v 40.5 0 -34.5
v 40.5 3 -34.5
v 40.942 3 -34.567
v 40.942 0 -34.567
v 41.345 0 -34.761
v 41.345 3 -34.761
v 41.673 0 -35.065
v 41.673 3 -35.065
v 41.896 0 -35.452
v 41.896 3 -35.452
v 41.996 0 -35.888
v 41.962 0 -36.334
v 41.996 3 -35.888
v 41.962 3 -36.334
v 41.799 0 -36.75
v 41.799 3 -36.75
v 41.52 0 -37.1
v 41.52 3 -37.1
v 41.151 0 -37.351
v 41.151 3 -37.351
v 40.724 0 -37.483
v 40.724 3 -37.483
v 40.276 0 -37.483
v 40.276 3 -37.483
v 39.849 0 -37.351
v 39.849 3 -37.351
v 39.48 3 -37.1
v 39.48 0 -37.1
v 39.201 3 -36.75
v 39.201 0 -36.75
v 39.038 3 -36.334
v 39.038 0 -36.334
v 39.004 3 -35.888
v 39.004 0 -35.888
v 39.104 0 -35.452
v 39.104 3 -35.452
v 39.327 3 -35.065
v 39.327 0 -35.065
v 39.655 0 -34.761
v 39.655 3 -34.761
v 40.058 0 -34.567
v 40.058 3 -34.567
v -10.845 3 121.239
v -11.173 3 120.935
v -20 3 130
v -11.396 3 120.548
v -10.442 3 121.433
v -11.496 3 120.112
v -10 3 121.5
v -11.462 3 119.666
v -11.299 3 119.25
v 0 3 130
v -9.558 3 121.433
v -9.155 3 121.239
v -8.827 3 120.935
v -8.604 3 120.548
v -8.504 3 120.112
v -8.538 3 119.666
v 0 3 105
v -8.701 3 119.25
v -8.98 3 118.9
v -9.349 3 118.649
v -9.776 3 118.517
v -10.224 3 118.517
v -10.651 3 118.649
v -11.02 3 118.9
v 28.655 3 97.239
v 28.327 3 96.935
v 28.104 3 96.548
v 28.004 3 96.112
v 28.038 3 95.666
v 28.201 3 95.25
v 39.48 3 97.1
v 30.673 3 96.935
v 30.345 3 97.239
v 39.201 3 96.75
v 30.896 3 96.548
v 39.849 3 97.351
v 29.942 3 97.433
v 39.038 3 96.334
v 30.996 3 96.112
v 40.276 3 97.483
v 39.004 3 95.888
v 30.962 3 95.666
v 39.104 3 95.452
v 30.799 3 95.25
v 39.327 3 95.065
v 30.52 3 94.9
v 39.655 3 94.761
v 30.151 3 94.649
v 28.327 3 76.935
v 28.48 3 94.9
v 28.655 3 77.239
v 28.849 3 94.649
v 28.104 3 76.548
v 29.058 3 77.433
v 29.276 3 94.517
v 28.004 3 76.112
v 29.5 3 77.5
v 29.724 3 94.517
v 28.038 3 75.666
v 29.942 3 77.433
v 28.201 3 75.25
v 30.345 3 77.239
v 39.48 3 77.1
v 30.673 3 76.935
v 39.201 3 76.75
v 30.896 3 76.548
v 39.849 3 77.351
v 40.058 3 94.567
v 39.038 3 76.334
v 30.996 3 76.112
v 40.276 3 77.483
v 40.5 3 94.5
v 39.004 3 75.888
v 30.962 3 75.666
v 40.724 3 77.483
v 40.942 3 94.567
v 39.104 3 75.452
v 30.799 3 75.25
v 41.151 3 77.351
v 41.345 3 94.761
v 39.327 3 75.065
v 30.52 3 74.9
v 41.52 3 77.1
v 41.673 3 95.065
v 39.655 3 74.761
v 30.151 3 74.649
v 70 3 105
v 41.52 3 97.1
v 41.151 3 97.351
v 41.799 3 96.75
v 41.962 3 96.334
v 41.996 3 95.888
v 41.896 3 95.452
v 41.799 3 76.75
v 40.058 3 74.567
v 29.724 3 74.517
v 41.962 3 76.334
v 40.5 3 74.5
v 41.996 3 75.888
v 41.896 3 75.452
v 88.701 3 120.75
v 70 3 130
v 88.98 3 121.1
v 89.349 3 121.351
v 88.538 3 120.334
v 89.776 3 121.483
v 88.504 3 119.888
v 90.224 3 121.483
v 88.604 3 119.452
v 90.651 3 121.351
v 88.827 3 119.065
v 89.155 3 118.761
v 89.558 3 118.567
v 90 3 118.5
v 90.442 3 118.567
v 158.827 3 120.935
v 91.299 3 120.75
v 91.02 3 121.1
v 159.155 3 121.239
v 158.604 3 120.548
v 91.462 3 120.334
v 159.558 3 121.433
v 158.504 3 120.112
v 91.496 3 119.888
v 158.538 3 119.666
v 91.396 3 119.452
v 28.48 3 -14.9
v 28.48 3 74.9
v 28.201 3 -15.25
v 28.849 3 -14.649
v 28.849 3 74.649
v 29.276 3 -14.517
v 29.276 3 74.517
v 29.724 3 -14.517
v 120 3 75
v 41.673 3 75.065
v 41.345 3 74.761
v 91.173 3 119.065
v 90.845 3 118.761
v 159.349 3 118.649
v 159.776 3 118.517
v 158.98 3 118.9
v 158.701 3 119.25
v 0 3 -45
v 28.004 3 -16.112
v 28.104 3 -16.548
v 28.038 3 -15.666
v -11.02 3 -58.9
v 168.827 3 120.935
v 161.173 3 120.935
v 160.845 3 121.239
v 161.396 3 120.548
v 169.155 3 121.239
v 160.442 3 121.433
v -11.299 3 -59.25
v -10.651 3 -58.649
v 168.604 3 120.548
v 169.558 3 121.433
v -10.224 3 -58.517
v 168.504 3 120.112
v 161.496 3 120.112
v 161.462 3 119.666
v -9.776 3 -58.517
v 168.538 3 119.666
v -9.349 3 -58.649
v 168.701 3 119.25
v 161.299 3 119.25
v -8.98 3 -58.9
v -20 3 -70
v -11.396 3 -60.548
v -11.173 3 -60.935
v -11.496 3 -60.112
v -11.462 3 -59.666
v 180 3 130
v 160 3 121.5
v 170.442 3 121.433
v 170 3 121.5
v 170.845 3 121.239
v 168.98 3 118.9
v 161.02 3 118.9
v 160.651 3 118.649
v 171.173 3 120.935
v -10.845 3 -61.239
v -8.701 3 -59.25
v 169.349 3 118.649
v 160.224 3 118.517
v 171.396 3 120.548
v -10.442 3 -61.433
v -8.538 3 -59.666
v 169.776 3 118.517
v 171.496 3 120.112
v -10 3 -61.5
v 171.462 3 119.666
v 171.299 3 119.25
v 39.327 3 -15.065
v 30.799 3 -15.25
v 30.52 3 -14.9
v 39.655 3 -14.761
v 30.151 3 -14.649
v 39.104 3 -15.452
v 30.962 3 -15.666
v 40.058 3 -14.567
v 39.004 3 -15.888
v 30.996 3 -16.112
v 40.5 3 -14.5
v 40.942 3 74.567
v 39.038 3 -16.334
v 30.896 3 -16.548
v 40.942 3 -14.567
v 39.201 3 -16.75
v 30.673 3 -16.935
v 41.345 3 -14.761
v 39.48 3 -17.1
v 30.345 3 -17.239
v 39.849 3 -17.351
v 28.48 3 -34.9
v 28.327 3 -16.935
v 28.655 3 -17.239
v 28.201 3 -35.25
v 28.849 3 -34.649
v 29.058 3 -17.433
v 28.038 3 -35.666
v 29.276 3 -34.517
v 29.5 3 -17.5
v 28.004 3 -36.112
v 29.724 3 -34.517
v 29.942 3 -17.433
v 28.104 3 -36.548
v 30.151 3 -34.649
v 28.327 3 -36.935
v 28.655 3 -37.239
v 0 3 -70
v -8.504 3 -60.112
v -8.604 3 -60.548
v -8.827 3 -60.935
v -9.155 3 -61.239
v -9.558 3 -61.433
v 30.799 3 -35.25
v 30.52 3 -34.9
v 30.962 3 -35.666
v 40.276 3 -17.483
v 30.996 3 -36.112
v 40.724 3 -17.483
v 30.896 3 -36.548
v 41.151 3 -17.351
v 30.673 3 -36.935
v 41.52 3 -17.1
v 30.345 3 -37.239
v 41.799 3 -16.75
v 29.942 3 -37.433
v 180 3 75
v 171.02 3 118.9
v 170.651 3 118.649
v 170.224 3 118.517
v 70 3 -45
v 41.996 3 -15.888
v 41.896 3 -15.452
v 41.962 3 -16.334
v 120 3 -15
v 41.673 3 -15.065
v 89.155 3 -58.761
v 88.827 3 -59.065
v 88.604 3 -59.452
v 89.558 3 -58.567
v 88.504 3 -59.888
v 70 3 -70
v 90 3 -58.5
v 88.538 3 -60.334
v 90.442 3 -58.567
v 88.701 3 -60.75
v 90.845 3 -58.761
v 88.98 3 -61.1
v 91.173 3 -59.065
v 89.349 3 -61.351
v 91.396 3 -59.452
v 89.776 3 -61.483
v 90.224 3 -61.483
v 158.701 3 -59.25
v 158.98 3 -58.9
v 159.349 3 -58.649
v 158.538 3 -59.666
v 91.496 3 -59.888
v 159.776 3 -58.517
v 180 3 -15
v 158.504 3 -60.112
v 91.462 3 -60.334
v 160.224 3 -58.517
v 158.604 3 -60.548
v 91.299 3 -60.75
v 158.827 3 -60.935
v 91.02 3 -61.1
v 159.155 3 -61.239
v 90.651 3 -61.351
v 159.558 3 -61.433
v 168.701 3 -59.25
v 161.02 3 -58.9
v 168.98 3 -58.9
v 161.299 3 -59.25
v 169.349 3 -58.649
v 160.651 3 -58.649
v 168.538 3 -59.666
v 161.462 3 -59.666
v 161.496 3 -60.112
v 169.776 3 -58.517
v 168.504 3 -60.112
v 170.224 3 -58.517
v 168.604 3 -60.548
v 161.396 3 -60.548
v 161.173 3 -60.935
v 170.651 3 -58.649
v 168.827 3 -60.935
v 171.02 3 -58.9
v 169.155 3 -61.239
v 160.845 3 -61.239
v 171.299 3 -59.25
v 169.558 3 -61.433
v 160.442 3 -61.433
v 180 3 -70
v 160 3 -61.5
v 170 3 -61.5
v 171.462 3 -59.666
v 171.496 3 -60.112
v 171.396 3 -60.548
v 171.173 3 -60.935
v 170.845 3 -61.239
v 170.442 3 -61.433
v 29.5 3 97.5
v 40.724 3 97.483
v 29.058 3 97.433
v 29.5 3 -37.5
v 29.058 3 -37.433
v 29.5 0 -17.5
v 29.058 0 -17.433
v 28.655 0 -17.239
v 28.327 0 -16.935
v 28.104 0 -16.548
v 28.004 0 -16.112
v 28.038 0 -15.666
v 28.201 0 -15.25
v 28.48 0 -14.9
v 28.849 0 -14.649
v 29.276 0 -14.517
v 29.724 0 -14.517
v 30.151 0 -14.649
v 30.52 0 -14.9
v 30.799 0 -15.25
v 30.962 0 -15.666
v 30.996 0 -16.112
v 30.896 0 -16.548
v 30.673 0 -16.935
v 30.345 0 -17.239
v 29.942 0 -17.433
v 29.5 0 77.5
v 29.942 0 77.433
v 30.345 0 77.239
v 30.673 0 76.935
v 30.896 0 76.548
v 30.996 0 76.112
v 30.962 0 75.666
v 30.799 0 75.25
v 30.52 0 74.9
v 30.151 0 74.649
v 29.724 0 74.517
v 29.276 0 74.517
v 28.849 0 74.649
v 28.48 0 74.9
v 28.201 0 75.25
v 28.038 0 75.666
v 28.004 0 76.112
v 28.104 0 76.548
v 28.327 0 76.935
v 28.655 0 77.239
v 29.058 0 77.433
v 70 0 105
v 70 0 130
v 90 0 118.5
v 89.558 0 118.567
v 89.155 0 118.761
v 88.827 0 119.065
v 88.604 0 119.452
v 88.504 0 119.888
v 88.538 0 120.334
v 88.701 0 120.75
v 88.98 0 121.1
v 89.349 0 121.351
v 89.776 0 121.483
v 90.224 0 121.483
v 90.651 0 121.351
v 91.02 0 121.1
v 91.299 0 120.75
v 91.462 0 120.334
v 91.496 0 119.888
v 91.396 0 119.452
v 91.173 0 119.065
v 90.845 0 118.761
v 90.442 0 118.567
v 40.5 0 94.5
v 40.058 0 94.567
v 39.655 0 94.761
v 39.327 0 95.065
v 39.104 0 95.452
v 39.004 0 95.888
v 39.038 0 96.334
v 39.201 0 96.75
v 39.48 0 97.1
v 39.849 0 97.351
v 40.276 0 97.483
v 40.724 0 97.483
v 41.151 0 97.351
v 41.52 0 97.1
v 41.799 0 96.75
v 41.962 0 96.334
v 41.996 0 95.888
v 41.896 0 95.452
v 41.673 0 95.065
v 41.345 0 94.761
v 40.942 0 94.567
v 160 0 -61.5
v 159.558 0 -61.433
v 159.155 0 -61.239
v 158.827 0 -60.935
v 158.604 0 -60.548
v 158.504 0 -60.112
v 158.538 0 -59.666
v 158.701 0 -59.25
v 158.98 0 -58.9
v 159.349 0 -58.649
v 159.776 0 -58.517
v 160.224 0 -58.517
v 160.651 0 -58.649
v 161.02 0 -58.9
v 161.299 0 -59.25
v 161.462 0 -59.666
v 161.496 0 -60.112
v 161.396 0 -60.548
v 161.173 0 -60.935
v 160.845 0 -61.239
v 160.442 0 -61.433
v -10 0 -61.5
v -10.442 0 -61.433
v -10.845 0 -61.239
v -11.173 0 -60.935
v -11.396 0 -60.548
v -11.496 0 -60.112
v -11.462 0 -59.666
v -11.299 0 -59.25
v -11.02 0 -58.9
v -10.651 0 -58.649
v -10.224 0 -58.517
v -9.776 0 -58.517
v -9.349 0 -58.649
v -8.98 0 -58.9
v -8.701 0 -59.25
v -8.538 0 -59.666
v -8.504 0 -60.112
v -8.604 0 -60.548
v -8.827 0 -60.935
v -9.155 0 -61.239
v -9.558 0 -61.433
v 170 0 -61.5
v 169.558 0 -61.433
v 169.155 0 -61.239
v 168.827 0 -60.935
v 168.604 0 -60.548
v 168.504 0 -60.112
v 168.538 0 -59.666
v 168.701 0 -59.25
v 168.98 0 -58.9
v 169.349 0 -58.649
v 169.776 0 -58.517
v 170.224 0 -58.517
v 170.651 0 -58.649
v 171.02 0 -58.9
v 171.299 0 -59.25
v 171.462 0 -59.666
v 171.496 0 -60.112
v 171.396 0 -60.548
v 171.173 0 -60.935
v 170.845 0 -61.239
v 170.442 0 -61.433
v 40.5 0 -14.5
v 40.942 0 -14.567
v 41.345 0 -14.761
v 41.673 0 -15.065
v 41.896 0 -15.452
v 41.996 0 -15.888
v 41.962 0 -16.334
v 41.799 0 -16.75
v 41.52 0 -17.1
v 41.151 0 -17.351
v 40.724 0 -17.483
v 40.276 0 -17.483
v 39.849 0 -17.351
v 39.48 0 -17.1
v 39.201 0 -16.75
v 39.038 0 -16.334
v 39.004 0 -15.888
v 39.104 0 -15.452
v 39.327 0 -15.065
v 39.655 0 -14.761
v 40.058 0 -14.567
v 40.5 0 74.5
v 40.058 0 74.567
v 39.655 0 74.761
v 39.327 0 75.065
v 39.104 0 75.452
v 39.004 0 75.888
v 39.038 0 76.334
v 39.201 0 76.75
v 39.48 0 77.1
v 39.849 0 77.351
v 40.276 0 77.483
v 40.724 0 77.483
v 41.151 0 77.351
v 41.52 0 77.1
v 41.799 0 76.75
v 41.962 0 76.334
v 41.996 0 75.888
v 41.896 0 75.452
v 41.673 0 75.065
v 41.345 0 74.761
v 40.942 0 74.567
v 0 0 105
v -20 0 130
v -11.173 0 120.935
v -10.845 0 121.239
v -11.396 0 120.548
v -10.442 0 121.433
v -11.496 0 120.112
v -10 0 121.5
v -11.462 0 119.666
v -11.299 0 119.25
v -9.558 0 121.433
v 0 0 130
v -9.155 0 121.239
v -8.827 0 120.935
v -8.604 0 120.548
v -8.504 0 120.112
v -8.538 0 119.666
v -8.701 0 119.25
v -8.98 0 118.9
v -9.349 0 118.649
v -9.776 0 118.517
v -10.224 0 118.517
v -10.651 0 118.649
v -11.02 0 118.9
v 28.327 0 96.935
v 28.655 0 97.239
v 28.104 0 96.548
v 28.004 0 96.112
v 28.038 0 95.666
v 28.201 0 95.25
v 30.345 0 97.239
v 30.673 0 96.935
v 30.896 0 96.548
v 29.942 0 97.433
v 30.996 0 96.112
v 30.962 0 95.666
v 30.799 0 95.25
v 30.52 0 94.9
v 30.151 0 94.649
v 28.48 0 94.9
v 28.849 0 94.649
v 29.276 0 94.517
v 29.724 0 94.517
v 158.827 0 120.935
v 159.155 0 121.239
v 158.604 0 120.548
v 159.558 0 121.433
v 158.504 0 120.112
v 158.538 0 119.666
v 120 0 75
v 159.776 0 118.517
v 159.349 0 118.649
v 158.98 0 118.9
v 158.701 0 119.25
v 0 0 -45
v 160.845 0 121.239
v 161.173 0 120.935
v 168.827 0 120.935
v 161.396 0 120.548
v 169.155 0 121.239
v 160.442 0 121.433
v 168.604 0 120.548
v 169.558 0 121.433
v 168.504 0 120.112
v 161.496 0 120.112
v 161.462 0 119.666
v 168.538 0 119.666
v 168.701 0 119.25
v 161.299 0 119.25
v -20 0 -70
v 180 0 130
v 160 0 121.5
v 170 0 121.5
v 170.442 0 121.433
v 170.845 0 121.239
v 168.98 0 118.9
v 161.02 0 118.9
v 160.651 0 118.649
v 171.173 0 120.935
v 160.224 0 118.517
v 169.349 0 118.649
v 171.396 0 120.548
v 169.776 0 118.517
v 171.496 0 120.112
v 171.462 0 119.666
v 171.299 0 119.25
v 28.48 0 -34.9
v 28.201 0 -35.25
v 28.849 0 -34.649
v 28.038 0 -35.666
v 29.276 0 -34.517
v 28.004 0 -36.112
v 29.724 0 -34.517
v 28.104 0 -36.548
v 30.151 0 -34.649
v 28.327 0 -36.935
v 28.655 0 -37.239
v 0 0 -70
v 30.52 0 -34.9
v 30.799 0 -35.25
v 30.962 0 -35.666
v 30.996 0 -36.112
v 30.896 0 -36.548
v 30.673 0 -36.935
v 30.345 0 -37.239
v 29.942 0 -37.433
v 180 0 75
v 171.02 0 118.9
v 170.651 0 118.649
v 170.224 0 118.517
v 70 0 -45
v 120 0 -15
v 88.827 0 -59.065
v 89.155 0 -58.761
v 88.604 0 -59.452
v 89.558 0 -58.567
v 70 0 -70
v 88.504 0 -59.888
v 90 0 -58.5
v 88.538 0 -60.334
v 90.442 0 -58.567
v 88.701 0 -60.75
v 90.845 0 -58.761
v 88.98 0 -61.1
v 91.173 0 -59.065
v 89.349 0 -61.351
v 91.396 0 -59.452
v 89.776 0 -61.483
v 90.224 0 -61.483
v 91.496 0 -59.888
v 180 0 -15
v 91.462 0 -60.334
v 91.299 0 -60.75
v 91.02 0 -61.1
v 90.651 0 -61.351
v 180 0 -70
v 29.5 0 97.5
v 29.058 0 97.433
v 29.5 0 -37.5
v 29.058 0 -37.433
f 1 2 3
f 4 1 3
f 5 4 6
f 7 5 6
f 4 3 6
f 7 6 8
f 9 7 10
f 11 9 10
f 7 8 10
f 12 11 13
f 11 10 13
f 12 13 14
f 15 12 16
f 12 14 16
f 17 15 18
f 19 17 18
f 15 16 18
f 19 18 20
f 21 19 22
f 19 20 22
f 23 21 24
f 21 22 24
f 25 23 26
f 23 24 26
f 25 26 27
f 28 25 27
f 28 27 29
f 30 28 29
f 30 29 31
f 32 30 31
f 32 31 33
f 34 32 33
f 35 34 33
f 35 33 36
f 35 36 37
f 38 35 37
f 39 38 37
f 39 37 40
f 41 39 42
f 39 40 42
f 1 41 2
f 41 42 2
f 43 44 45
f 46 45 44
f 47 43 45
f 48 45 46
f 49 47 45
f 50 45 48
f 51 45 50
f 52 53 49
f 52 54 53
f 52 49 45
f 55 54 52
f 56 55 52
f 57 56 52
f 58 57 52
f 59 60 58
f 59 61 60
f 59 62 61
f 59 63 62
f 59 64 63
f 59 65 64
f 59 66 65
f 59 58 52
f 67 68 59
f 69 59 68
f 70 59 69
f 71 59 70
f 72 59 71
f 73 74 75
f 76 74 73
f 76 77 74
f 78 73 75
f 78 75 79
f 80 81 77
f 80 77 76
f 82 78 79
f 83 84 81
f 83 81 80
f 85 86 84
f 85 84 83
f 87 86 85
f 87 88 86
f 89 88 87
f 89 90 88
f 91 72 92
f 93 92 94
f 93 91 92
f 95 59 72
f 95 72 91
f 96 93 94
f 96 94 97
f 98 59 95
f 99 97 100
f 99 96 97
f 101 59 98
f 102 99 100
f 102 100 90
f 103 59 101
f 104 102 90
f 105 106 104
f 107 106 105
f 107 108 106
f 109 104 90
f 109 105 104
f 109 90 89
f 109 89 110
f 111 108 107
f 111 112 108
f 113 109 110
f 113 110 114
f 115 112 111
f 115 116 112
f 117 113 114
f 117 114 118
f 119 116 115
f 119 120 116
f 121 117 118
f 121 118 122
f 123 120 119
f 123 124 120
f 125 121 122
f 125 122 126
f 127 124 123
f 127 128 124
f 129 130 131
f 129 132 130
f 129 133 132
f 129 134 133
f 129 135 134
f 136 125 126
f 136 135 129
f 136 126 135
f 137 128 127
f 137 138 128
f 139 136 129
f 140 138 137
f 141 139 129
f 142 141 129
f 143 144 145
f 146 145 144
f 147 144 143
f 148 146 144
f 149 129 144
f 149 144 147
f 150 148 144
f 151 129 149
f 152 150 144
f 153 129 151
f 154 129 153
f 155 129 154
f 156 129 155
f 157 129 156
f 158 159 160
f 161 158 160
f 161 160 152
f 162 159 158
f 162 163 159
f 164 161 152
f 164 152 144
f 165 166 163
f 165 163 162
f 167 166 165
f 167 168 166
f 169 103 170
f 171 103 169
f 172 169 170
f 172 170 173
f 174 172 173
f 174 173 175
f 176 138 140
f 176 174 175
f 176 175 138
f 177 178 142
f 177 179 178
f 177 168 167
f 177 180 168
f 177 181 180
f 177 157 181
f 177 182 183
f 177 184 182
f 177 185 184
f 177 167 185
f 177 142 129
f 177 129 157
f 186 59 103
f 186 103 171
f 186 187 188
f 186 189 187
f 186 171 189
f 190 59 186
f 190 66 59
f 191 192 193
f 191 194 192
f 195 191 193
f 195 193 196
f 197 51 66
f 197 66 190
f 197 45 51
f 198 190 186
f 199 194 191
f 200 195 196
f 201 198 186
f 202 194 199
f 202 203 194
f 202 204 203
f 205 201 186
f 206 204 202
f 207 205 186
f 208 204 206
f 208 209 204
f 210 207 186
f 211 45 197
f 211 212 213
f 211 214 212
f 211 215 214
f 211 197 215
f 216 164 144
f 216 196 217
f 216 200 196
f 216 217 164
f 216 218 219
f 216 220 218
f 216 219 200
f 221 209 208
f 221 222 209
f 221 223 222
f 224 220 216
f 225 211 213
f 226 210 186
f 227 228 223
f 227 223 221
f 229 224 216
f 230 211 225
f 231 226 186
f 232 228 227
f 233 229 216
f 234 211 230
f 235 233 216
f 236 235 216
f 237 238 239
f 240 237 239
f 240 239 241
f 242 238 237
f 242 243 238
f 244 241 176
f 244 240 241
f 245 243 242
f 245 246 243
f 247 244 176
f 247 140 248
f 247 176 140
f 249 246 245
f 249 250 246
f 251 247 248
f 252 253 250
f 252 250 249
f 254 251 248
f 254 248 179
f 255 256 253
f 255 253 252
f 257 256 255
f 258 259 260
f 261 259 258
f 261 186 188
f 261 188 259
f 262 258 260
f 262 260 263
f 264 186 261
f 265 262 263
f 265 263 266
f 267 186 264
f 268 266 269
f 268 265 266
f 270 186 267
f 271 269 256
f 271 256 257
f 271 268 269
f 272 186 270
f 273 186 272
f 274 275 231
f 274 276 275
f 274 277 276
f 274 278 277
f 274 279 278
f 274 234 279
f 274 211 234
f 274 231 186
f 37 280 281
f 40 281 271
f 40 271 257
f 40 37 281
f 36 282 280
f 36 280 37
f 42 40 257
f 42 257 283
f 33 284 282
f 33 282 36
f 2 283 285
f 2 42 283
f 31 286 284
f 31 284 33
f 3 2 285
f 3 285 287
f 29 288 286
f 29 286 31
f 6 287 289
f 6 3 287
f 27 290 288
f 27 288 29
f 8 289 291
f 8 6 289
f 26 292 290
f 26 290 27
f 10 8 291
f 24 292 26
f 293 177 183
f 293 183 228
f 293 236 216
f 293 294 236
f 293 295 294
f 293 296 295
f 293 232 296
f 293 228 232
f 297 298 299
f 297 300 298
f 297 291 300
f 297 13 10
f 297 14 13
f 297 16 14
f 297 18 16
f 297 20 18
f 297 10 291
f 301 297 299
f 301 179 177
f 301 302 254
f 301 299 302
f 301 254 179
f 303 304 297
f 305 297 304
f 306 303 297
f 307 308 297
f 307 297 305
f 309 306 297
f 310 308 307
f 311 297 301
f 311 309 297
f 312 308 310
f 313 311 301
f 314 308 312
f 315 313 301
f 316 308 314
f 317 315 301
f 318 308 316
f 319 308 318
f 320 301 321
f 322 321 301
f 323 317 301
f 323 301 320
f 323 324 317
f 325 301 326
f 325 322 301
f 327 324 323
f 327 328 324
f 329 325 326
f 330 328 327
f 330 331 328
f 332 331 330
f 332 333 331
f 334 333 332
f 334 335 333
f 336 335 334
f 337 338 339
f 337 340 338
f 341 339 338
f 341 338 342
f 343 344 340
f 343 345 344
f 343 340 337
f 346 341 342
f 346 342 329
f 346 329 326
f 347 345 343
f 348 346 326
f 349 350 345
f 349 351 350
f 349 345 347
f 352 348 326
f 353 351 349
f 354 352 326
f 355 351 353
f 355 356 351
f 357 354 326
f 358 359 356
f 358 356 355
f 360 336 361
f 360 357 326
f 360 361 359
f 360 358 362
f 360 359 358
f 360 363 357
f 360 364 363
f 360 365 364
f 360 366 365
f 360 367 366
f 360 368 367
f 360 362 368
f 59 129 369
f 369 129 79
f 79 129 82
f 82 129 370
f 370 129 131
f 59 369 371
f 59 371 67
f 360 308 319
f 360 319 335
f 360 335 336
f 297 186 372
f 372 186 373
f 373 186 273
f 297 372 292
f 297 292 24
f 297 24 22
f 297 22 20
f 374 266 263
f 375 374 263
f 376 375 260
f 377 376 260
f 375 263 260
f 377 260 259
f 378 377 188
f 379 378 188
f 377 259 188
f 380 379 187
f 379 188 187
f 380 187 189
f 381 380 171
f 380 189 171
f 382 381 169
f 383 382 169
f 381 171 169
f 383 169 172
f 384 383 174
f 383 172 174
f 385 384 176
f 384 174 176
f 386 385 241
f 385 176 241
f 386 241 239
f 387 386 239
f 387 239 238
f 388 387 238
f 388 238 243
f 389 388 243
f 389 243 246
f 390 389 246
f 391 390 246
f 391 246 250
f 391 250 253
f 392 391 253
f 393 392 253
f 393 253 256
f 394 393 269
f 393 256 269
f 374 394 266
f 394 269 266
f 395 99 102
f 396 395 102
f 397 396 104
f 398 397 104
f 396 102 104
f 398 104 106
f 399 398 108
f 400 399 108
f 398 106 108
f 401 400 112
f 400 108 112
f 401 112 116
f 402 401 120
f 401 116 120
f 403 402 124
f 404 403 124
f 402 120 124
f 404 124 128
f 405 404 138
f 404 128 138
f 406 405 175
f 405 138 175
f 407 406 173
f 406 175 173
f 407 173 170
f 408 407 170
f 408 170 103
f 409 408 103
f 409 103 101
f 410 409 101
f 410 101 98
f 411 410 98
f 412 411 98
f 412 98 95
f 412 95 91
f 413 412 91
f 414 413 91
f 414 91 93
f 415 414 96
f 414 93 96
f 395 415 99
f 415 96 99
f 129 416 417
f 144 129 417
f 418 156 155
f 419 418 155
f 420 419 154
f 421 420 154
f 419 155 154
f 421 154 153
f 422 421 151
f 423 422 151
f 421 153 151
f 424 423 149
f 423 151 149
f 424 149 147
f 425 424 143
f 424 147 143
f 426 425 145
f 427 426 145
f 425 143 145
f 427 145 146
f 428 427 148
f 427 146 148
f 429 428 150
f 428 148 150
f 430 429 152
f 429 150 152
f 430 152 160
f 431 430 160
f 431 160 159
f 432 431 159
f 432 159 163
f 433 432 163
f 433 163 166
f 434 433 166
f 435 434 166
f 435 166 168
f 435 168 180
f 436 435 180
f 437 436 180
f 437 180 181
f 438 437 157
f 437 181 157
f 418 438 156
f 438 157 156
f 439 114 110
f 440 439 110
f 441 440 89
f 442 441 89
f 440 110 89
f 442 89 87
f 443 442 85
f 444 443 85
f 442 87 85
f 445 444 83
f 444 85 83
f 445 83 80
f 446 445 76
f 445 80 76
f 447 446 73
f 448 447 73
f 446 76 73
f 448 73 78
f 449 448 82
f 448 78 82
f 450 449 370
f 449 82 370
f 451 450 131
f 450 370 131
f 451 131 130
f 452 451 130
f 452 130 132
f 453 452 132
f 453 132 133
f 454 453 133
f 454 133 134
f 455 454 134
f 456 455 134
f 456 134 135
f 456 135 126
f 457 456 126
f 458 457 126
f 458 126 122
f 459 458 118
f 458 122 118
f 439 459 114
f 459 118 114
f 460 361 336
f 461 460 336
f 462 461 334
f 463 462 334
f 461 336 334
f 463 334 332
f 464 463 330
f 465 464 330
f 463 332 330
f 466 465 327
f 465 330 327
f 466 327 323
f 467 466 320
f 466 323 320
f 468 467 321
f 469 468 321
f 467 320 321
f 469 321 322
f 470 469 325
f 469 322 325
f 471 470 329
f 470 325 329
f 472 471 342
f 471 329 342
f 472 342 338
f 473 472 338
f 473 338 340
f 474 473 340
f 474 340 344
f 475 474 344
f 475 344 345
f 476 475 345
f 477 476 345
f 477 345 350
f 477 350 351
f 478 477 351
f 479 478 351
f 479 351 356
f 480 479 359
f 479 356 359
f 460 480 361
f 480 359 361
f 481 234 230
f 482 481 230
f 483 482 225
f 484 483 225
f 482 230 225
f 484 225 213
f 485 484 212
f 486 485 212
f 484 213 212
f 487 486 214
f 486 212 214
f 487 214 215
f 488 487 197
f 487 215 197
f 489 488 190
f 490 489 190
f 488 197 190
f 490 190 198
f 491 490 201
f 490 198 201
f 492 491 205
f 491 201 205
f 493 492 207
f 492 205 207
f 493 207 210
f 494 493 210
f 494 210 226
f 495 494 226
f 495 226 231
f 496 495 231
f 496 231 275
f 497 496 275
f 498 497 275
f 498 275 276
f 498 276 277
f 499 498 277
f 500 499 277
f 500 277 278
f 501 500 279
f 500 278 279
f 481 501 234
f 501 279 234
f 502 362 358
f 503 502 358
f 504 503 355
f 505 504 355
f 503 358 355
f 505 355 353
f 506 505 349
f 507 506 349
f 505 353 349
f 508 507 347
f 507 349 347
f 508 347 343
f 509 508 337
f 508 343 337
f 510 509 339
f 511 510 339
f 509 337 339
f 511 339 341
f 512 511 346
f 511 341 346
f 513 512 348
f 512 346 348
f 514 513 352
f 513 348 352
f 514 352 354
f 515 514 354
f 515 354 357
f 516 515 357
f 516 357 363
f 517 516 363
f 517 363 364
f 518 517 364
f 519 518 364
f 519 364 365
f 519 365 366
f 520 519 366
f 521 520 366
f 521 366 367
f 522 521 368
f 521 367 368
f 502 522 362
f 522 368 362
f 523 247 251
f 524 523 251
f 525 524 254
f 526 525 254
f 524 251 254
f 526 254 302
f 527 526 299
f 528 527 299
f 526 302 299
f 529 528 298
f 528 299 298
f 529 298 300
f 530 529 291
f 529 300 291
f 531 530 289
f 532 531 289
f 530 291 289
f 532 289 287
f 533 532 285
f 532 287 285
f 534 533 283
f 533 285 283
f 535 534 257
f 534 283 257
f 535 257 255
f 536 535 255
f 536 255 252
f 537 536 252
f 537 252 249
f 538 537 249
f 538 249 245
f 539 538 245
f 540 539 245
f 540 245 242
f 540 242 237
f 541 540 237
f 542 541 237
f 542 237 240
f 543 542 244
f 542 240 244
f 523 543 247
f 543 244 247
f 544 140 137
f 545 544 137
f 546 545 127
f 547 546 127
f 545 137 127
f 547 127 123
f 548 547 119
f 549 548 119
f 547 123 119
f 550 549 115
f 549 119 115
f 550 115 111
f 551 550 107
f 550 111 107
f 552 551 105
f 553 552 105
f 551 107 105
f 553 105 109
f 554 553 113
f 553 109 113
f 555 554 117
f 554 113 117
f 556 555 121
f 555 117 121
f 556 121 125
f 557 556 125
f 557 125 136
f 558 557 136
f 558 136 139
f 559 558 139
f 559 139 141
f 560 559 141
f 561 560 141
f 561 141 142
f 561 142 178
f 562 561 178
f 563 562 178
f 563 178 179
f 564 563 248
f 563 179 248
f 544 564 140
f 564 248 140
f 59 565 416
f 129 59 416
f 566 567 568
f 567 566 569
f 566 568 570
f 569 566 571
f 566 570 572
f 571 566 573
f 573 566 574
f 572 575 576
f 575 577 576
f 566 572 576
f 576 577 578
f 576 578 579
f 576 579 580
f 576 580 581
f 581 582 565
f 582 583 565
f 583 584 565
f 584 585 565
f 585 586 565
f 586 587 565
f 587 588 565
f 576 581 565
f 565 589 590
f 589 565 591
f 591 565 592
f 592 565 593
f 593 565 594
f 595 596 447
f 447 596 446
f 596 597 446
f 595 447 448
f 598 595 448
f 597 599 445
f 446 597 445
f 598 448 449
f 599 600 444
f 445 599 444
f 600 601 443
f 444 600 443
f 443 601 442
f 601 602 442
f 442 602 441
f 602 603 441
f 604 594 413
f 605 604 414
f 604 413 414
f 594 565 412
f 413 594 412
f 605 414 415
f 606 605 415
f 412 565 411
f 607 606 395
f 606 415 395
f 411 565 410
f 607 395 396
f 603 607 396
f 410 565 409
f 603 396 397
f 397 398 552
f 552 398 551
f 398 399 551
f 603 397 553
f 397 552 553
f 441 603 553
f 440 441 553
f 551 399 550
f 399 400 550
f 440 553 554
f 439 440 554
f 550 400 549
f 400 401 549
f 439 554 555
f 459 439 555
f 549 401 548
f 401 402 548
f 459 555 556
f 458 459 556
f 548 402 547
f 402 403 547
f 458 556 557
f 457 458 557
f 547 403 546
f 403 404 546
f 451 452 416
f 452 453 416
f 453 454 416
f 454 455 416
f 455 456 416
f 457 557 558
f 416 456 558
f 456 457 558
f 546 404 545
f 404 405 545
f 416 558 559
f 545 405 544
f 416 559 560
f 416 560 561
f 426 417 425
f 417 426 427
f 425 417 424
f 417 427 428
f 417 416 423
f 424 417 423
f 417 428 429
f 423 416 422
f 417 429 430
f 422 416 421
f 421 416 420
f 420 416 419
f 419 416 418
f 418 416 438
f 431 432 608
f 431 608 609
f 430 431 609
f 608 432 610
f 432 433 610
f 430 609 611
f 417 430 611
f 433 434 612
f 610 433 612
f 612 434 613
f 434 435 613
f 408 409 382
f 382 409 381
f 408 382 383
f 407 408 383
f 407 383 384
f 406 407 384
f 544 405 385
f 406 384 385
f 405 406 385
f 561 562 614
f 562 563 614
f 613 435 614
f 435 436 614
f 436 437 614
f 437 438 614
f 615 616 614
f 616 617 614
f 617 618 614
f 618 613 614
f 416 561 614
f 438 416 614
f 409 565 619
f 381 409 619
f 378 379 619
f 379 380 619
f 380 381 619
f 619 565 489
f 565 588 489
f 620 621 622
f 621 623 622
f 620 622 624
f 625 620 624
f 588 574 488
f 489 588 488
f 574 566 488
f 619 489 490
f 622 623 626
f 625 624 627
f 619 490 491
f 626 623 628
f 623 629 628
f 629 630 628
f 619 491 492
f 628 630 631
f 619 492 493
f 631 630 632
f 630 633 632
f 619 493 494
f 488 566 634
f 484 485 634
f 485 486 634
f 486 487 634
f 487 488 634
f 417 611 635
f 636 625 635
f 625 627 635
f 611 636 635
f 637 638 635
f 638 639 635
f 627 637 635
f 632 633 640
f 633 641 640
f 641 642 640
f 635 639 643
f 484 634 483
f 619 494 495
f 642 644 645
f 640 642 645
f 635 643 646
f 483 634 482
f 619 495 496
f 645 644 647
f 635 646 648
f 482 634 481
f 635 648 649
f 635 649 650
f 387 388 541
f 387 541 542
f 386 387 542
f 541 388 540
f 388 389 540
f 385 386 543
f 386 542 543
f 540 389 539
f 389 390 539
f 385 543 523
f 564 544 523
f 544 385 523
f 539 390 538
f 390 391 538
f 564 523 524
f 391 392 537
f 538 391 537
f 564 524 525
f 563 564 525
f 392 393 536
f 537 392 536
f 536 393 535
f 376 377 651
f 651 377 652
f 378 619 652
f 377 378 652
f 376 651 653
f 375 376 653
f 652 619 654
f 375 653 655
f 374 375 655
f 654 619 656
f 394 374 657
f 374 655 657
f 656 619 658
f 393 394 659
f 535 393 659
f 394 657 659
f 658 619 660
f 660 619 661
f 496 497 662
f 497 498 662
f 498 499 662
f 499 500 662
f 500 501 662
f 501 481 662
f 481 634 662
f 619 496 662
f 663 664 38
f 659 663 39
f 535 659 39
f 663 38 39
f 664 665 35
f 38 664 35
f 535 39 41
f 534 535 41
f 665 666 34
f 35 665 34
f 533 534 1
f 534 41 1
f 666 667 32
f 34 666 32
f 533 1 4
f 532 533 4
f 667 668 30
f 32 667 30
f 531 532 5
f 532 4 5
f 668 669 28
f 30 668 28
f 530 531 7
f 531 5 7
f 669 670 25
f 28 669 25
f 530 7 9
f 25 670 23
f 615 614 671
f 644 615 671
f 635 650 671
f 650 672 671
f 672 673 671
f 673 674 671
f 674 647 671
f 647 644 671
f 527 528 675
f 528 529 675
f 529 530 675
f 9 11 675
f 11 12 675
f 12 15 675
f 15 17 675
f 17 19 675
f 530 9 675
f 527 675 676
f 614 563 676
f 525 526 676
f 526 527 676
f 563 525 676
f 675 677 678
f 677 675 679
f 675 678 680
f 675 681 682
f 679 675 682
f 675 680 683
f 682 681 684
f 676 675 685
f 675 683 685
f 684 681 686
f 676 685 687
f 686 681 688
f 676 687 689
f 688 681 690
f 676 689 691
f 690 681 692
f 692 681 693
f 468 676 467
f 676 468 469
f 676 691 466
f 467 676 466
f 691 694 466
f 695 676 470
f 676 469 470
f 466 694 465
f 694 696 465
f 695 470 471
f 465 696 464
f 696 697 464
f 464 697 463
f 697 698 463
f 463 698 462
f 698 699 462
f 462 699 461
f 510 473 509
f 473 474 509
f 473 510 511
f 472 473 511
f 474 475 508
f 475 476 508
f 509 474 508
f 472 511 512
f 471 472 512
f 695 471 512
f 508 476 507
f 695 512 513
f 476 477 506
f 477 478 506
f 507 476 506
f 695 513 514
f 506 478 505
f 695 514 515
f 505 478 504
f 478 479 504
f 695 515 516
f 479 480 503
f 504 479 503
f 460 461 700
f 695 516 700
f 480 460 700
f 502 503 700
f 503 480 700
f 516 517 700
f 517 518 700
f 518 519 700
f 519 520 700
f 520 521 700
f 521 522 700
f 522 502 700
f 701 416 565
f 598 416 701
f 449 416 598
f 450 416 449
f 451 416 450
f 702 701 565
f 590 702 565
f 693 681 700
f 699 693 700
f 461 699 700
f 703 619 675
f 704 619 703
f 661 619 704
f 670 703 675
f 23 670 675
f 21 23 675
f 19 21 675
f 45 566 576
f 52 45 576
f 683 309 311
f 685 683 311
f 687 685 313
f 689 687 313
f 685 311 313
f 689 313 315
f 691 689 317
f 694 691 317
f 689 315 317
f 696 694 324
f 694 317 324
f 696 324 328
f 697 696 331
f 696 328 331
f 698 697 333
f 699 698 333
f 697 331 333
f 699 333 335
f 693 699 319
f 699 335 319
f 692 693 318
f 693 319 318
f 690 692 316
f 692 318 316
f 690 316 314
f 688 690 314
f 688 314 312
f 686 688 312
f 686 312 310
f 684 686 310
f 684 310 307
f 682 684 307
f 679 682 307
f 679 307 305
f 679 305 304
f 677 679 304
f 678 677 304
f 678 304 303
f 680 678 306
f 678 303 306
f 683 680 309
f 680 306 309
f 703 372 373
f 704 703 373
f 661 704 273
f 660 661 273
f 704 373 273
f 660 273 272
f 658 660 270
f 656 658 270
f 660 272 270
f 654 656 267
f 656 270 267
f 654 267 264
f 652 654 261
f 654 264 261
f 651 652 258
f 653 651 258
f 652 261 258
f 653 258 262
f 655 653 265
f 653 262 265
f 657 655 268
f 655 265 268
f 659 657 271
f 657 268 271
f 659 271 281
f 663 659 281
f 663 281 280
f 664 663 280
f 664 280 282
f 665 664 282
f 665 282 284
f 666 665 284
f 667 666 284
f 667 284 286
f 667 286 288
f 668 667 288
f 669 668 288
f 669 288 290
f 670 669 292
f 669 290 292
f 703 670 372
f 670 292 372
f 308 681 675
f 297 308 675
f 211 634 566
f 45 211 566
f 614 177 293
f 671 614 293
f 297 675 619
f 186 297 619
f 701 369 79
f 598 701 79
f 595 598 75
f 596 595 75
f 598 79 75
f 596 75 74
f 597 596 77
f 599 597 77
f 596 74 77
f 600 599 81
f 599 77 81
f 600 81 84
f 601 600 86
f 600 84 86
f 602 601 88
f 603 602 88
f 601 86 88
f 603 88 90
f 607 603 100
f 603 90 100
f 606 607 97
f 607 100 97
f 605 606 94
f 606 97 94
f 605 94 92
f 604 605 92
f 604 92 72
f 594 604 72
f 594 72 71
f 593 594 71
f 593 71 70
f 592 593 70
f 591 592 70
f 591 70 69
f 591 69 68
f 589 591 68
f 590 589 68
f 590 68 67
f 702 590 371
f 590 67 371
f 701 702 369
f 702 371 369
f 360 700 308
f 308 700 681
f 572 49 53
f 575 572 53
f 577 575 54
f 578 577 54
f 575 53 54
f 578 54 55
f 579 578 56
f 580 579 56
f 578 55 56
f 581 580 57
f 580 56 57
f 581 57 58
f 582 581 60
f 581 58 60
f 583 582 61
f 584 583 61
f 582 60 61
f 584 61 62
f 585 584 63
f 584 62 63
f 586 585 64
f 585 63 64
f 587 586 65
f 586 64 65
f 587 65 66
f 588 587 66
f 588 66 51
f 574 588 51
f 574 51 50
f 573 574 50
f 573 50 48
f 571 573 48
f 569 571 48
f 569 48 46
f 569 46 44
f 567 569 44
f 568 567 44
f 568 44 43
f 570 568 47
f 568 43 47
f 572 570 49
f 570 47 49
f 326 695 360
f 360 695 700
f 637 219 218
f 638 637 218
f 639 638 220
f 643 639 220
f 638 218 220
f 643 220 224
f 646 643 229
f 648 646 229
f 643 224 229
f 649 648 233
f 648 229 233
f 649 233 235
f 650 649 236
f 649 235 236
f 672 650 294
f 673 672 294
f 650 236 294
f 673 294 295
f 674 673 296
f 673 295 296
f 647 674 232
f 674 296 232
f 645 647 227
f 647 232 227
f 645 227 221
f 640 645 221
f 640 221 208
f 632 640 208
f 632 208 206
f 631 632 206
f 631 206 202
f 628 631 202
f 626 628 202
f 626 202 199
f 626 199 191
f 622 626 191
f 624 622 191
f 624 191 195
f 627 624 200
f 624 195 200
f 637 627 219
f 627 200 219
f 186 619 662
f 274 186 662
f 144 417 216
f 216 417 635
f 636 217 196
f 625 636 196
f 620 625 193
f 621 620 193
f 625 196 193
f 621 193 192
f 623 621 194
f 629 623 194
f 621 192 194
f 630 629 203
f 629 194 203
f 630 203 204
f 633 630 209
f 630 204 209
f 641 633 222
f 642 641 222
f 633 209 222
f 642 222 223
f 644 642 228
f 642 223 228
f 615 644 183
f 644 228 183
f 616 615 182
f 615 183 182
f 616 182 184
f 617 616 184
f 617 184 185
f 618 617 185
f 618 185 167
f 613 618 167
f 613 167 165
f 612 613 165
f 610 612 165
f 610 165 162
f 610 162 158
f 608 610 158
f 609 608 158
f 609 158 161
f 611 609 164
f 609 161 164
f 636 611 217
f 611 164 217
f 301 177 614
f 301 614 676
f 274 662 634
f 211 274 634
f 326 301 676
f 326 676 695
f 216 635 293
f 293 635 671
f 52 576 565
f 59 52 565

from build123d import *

# Parameters (mm, degrees)
BOSS_EXTRUDE1_DEPTH = 3
SKETCH2_R           = 1.5
CUT_EXTRUDE1_DEPTH  = 3
SKETCH6_R           = 1.5
CUT_EXTRUDE2_DEPTH  = 3
SKETCH8_W           = 60
SKETCH8_H           = 90
CUT_EXTRUDE4_DEPTH  = 3
SKETCH3_R           = 1.5
CUT_EXTRUDE5_DEPTH  = 3


with BuildPart() as part:
    # Sketch1 → Boss-Extrude1 (new body)
    with BuildSketch(Plane(origin=(0, 0, 0), x_dir=(1, 0, 0), z_dir=(0, 1, 0))):
        Polygon((-20, -130), (0, -130), (0, -105), (70, -105), (70, -130), (180, -130), (180, 70), (70, 70), (70, 45), (0, 45), (0, 70), (-20, 70), align=None)
    extrude(amount=BOSS_EXTRUDE1_DEPTH)

    # Sketch2 → Cut-Extrude1 (cut)
    with BuildSketch(Plane(origin=(0, 3, 0), x_dir=(1, 0, 0), z_dir=(0, 1, 0))):
        with Locations(Location((29.5, -96, 0), (0, 0, 270))):
            Circle(SKETCH2_R)
        with Locations(Location((29.5, -76, 0), (0, 0, 270))):
            Circle(SKETCH2_R)
        with Locations(Location((40.5, -96, 0), (0, 0, 90))):
            Circle(SKETCH2_R)
        with Locations(Location((40.5, -76, 0), (0, 0, 90))):
            Circle(SKETCH2_R)
        with Locations(Location((29.5, 36, 0), (0, 0, 90))):
            Circle(SKETCH2_R)
        with Locations(Location((40.5, 36, 0), (0, 0, 270))):
            Circle(SKETCH2_R)
        with Locations(Location((40.5, 16, 0), (0, 0, 270))):
            Circle(SKETCH2_R)
        with Locations(Location((29.5, 16, 0), (0, 0, 90))):
            Circle(SKETCH2_R)
    extrude(amount=-CUT_EXTRUDE1_DEPTH, mode=Mode.SUBTRACT)

    # Sketch6 → Cut-Extrude2 (cut)
    with BuildSketch(Plane(origin=(0, 3, 0), x_dir=(1, 0, 0), z_dir=(0, 1, 0))):
        with Locations(Location((170, -120, 0), (0, 0, 270))):
            Circle(SKETCH6_R)
        with Locations(Location((170, 60, 0), (0, 0, 90))):
            Circle(SKETCH6_R)
        with Locations(Location((90, -120, 0), (0, 0, 90))):
            Circle(SKETCH6_R)
        with Locations(Location((90, 60, 0), (0, 0, 270))):
            Circle(SKETCH6_R)
    extrude(amount=-CUT_EXTRUDE2_DEPTH, mode=Mode.SUBTRACT)

    # Sketch8 → Cut-Extrude4 (cut)
    with BuildSketch(Plane(origin=(0, 3, 0), x_dir=(1, 0, 0), z_dir=(0, 1, 0))):
        with Locations((150, -30)):
            Rectangle(SKETCH8_W, SKETCH8_H)
    extrude(amount=-CUT_EXTRUDE4_DEPTH, mode=Mode.SUBTRACT)

    # Sketch3 → Cut-Extrude5 (cut)
    with BuildSketch(Plane(origin=(0, 3, 0), x_dir=(1, 0, 0), z_dir=(0, 1, 0))):
        with Locations(Location((-10, -120, 0), (0, 0, 270))):
            Circle(SKETCH3_R)
        with Locations(Location((160, -120, 0), (0, 0, 270))):
            Circle(SKETCH3_R)
        with Locations(Location((160, 60, 0), (0, 0, 90))):
            Circle(SKETCH3_R)
        with Locations(Location((-10, 60, 0), (0, 0, 90))):
            Circle(SKETCH3_R)
    extrude(amount=-CUT_EXTRUDE5_DEPTH, mode=Mode.SUBTRACT)


solid = part.part
